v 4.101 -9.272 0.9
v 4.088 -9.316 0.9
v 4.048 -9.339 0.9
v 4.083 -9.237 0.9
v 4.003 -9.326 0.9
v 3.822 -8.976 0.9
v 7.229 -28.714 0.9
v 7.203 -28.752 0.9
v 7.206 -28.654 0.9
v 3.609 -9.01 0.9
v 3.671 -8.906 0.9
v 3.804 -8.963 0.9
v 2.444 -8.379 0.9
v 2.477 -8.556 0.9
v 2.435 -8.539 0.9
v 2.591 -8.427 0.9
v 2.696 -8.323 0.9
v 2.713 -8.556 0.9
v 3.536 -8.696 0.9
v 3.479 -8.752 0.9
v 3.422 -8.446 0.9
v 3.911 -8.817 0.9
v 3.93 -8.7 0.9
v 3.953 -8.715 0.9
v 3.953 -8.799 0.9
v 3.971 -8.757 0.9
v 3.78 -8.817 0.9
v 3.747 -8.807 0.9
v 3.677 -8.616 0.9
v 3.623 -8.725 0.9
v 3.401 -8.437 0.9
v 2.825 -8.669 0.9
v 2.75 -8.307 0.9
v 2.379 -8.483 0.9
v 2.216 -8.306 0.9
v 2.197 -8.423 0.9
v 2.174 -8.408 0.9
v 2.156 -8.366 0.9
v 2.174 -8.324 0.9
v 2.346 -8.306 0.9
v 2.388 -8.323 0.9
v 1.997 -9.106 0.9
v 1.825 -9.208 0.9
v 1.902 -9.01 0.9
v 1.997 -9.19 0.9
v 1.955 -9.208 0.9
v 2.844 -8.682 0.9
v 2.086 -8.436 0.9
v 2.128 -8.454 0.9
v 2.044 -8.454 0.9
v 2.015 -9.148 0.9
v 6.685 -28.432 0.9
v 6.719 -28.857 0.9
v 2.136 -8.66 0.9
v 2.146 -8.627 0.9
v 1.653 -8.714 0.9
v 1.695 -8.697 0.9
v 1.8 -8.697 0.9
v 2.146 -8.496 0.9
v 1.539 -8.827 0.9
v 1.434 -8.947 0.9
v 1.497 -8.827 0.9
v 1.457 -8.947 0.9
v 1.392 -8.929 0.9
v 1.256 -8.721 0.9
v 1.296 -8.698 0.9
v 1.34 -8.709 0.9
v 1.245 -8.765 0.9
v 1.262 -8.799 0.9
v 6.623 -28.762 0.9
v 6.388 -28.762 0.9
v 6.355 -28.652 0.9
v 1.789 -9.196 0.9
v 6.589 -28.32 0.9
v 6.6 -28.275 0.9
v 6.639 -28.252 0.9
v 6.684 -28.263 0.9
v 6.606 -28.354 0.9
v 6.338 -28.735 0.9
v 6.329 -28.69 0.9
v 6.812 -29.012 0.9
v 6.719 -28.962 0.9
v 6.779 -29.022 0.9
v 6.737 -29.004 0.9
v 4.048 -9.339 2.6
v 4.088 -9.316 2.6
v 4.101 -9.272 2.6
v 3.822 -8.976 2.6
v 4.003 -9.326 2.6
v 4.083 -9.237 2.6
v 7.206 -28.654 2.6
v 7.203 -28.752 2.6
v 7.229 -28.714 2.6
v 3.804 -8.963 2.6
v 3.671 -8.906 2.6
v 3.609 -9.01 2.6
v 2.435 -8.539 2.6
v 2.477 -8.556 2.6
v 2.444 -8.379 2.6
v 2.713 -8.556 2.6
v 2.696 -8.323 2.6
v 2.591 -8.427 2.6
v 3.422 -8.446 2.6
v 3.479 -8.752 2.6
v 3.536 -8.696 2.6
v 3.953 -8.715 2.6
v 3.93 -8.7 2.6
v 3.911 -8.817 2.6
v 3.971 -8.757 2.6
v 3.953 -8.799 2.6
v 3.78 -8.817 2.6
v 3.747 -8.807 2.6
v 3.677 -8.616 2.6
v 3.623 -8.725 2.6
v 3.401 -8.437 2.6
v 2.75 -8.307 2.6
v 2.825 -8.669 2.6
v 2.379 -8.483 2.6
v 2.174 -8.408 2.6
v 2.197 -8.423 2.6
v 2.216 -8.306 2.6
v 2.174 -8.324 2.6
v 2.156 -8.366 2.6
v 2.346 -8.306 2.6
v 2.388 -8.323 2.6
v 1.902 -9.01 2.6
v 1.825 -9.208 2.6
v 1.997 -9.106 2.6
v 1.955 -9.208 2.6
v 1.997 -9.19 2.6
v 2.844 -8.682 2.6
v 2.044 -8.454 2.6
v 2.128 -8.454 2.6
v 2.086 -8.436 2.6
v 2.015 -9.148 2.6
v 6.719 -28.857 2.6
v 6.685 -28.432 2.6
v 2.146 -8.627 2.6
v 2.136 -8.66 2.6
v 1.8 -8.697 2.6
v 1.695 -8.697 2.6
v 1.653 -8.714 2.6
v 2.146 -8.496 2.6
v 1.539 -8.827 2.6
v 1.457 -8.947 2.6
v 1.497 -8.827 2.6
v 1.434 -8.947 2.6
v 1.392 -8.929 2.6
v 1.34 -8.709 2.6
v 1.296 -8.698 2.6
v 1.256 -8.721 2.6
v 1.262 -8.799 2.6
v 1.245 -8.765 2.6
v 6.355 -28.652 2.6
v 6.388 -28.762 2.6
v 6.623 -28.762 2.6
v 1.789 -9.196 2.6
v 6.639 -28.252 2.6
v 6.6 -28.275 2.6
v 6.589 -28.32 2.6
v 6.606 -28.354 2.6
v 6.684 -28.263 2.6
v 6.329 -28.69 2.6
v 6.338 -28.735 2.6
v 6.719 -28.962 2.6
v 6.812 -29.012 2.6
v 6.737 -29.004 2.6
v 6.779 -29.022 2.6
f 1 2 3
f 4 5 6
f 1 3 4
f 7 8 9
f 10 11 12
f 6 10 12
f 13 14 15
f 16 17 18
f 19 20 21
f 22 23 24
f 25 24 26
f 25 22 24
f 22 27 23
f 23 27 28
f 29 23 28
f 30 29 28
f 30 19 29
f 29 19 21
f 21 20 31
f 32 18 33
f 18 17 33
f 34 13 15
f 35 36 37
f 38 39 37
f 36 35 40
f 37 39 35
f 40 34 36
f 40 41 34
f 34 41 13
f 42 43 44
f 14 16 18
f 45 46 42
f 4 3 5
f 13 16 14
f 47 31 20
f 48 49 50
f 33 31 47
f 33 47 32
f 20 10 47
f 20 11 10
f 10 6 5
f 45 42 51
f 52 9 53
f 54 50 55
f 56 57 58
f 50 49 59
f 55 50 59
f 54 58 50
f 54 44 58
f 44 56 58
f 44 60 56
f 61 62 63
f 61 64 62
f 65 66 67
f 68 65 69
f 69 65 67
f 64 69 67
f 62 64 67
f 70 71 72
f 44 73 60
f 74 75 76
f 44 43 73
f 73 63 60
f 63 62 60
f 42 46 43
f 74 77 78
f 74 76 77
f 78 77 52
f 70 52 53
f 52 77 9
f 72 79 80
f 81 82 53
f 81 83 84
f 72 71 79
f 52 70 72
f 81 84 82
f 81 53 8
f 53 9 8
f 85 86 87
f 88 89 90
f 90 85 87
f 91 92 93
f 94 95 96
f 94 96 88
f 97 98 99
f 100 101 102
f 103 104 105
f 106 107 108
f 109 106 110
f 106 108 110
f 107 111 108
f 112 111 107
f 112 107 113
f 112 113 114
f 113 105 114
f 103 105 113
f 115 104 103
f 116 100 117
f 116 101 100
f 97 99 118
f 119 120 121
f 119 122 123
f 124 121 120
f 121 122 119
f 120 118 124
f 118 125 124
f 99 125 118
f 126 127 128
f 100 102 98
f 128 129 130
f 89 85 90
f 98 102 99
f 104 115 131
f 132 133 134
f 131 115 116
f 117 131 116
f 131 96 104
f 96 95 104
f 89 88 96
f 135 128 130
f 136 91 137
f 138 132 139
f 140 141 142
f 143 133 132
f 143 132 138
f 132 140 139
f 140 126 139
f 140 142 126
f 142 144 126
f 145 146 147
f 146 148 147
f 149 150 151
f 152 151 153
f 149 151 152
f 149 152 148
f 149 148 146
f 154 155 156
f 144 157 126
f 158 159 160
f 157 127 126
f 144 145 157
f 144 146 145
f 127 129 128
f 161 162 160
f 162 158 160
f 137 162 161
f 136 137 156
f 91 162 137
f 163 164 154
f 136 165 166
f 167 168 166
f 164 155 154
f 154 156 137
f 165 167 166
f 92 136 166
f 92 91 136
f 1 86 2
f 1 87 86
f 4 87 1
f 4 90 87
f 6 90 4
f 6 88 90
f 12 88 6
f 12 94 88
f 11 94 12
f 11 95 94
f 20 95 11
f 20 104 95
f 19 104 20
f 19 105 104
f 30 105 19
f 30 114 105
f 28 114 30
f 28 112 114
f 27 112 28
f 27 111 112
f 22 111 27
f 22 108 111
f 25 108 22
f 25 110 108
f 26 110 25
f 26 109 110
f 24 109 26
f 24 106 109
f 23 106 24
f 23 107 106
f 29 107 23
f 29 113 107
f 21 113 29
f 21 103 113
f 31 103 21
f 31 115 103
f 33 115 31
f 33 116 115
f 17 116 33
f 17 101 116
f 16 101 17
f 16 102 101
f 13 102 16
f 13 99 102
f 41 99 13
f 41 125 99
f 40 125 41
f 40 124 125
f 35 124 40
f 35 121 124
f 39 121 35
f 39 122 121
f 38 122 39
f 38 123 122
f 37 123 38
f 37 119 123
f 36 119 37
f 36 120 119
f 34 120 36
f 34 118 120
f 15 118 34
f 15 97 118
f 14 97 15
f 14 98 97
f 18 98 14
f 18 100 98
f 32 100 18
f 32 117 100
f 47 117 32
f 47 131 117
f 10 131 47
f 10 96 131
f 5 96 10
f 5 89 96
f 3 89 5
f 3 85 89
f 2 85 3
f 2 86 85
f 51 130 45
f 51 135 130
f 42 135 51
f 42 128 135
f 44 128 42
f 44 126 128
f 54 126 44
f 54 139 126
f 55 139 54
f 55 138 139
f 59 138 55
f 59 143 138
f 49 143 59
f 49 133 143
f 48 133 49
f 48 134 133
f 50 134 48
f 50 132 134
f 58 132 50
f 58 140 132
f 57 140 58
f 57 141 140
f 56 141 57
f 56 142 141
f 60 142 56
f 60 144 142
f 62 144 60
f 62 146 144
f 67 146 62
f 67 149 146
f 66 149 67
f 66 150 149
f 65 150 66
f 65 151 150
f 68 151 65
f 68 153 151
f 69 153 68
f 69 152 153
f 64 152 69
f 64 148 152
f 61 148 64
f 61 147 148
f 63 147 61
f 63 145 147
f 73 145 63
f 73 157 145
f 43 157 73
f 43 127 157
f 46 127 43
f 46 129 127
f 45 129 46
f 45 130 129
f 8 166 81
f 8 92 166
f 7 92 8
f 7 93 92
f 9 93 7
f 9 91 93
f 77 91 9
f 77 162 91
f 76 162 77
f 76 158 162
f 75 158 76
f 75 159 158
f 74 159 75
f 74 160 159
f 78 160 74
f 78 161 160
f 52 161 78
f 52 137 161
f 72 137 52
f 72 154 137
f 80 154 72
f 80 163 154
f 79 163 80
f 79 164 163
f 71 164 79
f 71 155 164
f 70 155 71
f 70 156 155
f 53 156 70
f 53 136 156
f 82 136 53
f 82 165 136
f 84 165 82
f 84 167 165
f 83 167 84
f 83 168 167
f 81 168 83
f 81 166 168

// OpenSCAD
$fn = 24;
translate([0, -2.500, 0.900])
  linear_extrude(height=1.700) {
offset(r=0.06, $fn=8) {
    polygon(points=[[6.388,-26.202],[6.648,-26.202],[6.779,-26.332],[6.779,-26.462],[7.170,-26.202],[7.430,-26.202],[7.561,-26.332],[7.691,-26.332],[7.561,-26.332],[7.430,-26.202],[7.170,-26.202],[6.648,-25.811],[6.779,-25.941]], paths=[[0,1,2,3,4,5,6,7,8,9,10,11,12]]);
    polygon(points=[[1.304,-6.257],[1.825,-6.648],[1.955,-6.648],[1.825,-6.518],[2.086,-6.127],[2.477,-6.387],[2.086,-6.127],[2.086,-5.996],[2.216,-5.866],[2.346,-5.866],[2.477,-5.996],[2.738,-5.996],[2.868,-6.127],[3.780,-6.518],[4.041,-6.779],[3.389,-6.257],[3.520,-6.127],[3.911,-6.257],[3.780,-6.257],[3.389,-5.996],[2.738,-5.866],[2.607,-5.736],[2.738,-5.866],[2.607,-5.996],[2.216,-5.866],[1.825,-6.257],[1.695,-6.257],[1.564,-6.387],[1.434,-6.387]], paths=[[0,1,2,3,4,5,6,7,8,9,10,11,12,13,14,15,16,17,18,19,20,21,22,23,24,25,26,27,28]]);
}
}
